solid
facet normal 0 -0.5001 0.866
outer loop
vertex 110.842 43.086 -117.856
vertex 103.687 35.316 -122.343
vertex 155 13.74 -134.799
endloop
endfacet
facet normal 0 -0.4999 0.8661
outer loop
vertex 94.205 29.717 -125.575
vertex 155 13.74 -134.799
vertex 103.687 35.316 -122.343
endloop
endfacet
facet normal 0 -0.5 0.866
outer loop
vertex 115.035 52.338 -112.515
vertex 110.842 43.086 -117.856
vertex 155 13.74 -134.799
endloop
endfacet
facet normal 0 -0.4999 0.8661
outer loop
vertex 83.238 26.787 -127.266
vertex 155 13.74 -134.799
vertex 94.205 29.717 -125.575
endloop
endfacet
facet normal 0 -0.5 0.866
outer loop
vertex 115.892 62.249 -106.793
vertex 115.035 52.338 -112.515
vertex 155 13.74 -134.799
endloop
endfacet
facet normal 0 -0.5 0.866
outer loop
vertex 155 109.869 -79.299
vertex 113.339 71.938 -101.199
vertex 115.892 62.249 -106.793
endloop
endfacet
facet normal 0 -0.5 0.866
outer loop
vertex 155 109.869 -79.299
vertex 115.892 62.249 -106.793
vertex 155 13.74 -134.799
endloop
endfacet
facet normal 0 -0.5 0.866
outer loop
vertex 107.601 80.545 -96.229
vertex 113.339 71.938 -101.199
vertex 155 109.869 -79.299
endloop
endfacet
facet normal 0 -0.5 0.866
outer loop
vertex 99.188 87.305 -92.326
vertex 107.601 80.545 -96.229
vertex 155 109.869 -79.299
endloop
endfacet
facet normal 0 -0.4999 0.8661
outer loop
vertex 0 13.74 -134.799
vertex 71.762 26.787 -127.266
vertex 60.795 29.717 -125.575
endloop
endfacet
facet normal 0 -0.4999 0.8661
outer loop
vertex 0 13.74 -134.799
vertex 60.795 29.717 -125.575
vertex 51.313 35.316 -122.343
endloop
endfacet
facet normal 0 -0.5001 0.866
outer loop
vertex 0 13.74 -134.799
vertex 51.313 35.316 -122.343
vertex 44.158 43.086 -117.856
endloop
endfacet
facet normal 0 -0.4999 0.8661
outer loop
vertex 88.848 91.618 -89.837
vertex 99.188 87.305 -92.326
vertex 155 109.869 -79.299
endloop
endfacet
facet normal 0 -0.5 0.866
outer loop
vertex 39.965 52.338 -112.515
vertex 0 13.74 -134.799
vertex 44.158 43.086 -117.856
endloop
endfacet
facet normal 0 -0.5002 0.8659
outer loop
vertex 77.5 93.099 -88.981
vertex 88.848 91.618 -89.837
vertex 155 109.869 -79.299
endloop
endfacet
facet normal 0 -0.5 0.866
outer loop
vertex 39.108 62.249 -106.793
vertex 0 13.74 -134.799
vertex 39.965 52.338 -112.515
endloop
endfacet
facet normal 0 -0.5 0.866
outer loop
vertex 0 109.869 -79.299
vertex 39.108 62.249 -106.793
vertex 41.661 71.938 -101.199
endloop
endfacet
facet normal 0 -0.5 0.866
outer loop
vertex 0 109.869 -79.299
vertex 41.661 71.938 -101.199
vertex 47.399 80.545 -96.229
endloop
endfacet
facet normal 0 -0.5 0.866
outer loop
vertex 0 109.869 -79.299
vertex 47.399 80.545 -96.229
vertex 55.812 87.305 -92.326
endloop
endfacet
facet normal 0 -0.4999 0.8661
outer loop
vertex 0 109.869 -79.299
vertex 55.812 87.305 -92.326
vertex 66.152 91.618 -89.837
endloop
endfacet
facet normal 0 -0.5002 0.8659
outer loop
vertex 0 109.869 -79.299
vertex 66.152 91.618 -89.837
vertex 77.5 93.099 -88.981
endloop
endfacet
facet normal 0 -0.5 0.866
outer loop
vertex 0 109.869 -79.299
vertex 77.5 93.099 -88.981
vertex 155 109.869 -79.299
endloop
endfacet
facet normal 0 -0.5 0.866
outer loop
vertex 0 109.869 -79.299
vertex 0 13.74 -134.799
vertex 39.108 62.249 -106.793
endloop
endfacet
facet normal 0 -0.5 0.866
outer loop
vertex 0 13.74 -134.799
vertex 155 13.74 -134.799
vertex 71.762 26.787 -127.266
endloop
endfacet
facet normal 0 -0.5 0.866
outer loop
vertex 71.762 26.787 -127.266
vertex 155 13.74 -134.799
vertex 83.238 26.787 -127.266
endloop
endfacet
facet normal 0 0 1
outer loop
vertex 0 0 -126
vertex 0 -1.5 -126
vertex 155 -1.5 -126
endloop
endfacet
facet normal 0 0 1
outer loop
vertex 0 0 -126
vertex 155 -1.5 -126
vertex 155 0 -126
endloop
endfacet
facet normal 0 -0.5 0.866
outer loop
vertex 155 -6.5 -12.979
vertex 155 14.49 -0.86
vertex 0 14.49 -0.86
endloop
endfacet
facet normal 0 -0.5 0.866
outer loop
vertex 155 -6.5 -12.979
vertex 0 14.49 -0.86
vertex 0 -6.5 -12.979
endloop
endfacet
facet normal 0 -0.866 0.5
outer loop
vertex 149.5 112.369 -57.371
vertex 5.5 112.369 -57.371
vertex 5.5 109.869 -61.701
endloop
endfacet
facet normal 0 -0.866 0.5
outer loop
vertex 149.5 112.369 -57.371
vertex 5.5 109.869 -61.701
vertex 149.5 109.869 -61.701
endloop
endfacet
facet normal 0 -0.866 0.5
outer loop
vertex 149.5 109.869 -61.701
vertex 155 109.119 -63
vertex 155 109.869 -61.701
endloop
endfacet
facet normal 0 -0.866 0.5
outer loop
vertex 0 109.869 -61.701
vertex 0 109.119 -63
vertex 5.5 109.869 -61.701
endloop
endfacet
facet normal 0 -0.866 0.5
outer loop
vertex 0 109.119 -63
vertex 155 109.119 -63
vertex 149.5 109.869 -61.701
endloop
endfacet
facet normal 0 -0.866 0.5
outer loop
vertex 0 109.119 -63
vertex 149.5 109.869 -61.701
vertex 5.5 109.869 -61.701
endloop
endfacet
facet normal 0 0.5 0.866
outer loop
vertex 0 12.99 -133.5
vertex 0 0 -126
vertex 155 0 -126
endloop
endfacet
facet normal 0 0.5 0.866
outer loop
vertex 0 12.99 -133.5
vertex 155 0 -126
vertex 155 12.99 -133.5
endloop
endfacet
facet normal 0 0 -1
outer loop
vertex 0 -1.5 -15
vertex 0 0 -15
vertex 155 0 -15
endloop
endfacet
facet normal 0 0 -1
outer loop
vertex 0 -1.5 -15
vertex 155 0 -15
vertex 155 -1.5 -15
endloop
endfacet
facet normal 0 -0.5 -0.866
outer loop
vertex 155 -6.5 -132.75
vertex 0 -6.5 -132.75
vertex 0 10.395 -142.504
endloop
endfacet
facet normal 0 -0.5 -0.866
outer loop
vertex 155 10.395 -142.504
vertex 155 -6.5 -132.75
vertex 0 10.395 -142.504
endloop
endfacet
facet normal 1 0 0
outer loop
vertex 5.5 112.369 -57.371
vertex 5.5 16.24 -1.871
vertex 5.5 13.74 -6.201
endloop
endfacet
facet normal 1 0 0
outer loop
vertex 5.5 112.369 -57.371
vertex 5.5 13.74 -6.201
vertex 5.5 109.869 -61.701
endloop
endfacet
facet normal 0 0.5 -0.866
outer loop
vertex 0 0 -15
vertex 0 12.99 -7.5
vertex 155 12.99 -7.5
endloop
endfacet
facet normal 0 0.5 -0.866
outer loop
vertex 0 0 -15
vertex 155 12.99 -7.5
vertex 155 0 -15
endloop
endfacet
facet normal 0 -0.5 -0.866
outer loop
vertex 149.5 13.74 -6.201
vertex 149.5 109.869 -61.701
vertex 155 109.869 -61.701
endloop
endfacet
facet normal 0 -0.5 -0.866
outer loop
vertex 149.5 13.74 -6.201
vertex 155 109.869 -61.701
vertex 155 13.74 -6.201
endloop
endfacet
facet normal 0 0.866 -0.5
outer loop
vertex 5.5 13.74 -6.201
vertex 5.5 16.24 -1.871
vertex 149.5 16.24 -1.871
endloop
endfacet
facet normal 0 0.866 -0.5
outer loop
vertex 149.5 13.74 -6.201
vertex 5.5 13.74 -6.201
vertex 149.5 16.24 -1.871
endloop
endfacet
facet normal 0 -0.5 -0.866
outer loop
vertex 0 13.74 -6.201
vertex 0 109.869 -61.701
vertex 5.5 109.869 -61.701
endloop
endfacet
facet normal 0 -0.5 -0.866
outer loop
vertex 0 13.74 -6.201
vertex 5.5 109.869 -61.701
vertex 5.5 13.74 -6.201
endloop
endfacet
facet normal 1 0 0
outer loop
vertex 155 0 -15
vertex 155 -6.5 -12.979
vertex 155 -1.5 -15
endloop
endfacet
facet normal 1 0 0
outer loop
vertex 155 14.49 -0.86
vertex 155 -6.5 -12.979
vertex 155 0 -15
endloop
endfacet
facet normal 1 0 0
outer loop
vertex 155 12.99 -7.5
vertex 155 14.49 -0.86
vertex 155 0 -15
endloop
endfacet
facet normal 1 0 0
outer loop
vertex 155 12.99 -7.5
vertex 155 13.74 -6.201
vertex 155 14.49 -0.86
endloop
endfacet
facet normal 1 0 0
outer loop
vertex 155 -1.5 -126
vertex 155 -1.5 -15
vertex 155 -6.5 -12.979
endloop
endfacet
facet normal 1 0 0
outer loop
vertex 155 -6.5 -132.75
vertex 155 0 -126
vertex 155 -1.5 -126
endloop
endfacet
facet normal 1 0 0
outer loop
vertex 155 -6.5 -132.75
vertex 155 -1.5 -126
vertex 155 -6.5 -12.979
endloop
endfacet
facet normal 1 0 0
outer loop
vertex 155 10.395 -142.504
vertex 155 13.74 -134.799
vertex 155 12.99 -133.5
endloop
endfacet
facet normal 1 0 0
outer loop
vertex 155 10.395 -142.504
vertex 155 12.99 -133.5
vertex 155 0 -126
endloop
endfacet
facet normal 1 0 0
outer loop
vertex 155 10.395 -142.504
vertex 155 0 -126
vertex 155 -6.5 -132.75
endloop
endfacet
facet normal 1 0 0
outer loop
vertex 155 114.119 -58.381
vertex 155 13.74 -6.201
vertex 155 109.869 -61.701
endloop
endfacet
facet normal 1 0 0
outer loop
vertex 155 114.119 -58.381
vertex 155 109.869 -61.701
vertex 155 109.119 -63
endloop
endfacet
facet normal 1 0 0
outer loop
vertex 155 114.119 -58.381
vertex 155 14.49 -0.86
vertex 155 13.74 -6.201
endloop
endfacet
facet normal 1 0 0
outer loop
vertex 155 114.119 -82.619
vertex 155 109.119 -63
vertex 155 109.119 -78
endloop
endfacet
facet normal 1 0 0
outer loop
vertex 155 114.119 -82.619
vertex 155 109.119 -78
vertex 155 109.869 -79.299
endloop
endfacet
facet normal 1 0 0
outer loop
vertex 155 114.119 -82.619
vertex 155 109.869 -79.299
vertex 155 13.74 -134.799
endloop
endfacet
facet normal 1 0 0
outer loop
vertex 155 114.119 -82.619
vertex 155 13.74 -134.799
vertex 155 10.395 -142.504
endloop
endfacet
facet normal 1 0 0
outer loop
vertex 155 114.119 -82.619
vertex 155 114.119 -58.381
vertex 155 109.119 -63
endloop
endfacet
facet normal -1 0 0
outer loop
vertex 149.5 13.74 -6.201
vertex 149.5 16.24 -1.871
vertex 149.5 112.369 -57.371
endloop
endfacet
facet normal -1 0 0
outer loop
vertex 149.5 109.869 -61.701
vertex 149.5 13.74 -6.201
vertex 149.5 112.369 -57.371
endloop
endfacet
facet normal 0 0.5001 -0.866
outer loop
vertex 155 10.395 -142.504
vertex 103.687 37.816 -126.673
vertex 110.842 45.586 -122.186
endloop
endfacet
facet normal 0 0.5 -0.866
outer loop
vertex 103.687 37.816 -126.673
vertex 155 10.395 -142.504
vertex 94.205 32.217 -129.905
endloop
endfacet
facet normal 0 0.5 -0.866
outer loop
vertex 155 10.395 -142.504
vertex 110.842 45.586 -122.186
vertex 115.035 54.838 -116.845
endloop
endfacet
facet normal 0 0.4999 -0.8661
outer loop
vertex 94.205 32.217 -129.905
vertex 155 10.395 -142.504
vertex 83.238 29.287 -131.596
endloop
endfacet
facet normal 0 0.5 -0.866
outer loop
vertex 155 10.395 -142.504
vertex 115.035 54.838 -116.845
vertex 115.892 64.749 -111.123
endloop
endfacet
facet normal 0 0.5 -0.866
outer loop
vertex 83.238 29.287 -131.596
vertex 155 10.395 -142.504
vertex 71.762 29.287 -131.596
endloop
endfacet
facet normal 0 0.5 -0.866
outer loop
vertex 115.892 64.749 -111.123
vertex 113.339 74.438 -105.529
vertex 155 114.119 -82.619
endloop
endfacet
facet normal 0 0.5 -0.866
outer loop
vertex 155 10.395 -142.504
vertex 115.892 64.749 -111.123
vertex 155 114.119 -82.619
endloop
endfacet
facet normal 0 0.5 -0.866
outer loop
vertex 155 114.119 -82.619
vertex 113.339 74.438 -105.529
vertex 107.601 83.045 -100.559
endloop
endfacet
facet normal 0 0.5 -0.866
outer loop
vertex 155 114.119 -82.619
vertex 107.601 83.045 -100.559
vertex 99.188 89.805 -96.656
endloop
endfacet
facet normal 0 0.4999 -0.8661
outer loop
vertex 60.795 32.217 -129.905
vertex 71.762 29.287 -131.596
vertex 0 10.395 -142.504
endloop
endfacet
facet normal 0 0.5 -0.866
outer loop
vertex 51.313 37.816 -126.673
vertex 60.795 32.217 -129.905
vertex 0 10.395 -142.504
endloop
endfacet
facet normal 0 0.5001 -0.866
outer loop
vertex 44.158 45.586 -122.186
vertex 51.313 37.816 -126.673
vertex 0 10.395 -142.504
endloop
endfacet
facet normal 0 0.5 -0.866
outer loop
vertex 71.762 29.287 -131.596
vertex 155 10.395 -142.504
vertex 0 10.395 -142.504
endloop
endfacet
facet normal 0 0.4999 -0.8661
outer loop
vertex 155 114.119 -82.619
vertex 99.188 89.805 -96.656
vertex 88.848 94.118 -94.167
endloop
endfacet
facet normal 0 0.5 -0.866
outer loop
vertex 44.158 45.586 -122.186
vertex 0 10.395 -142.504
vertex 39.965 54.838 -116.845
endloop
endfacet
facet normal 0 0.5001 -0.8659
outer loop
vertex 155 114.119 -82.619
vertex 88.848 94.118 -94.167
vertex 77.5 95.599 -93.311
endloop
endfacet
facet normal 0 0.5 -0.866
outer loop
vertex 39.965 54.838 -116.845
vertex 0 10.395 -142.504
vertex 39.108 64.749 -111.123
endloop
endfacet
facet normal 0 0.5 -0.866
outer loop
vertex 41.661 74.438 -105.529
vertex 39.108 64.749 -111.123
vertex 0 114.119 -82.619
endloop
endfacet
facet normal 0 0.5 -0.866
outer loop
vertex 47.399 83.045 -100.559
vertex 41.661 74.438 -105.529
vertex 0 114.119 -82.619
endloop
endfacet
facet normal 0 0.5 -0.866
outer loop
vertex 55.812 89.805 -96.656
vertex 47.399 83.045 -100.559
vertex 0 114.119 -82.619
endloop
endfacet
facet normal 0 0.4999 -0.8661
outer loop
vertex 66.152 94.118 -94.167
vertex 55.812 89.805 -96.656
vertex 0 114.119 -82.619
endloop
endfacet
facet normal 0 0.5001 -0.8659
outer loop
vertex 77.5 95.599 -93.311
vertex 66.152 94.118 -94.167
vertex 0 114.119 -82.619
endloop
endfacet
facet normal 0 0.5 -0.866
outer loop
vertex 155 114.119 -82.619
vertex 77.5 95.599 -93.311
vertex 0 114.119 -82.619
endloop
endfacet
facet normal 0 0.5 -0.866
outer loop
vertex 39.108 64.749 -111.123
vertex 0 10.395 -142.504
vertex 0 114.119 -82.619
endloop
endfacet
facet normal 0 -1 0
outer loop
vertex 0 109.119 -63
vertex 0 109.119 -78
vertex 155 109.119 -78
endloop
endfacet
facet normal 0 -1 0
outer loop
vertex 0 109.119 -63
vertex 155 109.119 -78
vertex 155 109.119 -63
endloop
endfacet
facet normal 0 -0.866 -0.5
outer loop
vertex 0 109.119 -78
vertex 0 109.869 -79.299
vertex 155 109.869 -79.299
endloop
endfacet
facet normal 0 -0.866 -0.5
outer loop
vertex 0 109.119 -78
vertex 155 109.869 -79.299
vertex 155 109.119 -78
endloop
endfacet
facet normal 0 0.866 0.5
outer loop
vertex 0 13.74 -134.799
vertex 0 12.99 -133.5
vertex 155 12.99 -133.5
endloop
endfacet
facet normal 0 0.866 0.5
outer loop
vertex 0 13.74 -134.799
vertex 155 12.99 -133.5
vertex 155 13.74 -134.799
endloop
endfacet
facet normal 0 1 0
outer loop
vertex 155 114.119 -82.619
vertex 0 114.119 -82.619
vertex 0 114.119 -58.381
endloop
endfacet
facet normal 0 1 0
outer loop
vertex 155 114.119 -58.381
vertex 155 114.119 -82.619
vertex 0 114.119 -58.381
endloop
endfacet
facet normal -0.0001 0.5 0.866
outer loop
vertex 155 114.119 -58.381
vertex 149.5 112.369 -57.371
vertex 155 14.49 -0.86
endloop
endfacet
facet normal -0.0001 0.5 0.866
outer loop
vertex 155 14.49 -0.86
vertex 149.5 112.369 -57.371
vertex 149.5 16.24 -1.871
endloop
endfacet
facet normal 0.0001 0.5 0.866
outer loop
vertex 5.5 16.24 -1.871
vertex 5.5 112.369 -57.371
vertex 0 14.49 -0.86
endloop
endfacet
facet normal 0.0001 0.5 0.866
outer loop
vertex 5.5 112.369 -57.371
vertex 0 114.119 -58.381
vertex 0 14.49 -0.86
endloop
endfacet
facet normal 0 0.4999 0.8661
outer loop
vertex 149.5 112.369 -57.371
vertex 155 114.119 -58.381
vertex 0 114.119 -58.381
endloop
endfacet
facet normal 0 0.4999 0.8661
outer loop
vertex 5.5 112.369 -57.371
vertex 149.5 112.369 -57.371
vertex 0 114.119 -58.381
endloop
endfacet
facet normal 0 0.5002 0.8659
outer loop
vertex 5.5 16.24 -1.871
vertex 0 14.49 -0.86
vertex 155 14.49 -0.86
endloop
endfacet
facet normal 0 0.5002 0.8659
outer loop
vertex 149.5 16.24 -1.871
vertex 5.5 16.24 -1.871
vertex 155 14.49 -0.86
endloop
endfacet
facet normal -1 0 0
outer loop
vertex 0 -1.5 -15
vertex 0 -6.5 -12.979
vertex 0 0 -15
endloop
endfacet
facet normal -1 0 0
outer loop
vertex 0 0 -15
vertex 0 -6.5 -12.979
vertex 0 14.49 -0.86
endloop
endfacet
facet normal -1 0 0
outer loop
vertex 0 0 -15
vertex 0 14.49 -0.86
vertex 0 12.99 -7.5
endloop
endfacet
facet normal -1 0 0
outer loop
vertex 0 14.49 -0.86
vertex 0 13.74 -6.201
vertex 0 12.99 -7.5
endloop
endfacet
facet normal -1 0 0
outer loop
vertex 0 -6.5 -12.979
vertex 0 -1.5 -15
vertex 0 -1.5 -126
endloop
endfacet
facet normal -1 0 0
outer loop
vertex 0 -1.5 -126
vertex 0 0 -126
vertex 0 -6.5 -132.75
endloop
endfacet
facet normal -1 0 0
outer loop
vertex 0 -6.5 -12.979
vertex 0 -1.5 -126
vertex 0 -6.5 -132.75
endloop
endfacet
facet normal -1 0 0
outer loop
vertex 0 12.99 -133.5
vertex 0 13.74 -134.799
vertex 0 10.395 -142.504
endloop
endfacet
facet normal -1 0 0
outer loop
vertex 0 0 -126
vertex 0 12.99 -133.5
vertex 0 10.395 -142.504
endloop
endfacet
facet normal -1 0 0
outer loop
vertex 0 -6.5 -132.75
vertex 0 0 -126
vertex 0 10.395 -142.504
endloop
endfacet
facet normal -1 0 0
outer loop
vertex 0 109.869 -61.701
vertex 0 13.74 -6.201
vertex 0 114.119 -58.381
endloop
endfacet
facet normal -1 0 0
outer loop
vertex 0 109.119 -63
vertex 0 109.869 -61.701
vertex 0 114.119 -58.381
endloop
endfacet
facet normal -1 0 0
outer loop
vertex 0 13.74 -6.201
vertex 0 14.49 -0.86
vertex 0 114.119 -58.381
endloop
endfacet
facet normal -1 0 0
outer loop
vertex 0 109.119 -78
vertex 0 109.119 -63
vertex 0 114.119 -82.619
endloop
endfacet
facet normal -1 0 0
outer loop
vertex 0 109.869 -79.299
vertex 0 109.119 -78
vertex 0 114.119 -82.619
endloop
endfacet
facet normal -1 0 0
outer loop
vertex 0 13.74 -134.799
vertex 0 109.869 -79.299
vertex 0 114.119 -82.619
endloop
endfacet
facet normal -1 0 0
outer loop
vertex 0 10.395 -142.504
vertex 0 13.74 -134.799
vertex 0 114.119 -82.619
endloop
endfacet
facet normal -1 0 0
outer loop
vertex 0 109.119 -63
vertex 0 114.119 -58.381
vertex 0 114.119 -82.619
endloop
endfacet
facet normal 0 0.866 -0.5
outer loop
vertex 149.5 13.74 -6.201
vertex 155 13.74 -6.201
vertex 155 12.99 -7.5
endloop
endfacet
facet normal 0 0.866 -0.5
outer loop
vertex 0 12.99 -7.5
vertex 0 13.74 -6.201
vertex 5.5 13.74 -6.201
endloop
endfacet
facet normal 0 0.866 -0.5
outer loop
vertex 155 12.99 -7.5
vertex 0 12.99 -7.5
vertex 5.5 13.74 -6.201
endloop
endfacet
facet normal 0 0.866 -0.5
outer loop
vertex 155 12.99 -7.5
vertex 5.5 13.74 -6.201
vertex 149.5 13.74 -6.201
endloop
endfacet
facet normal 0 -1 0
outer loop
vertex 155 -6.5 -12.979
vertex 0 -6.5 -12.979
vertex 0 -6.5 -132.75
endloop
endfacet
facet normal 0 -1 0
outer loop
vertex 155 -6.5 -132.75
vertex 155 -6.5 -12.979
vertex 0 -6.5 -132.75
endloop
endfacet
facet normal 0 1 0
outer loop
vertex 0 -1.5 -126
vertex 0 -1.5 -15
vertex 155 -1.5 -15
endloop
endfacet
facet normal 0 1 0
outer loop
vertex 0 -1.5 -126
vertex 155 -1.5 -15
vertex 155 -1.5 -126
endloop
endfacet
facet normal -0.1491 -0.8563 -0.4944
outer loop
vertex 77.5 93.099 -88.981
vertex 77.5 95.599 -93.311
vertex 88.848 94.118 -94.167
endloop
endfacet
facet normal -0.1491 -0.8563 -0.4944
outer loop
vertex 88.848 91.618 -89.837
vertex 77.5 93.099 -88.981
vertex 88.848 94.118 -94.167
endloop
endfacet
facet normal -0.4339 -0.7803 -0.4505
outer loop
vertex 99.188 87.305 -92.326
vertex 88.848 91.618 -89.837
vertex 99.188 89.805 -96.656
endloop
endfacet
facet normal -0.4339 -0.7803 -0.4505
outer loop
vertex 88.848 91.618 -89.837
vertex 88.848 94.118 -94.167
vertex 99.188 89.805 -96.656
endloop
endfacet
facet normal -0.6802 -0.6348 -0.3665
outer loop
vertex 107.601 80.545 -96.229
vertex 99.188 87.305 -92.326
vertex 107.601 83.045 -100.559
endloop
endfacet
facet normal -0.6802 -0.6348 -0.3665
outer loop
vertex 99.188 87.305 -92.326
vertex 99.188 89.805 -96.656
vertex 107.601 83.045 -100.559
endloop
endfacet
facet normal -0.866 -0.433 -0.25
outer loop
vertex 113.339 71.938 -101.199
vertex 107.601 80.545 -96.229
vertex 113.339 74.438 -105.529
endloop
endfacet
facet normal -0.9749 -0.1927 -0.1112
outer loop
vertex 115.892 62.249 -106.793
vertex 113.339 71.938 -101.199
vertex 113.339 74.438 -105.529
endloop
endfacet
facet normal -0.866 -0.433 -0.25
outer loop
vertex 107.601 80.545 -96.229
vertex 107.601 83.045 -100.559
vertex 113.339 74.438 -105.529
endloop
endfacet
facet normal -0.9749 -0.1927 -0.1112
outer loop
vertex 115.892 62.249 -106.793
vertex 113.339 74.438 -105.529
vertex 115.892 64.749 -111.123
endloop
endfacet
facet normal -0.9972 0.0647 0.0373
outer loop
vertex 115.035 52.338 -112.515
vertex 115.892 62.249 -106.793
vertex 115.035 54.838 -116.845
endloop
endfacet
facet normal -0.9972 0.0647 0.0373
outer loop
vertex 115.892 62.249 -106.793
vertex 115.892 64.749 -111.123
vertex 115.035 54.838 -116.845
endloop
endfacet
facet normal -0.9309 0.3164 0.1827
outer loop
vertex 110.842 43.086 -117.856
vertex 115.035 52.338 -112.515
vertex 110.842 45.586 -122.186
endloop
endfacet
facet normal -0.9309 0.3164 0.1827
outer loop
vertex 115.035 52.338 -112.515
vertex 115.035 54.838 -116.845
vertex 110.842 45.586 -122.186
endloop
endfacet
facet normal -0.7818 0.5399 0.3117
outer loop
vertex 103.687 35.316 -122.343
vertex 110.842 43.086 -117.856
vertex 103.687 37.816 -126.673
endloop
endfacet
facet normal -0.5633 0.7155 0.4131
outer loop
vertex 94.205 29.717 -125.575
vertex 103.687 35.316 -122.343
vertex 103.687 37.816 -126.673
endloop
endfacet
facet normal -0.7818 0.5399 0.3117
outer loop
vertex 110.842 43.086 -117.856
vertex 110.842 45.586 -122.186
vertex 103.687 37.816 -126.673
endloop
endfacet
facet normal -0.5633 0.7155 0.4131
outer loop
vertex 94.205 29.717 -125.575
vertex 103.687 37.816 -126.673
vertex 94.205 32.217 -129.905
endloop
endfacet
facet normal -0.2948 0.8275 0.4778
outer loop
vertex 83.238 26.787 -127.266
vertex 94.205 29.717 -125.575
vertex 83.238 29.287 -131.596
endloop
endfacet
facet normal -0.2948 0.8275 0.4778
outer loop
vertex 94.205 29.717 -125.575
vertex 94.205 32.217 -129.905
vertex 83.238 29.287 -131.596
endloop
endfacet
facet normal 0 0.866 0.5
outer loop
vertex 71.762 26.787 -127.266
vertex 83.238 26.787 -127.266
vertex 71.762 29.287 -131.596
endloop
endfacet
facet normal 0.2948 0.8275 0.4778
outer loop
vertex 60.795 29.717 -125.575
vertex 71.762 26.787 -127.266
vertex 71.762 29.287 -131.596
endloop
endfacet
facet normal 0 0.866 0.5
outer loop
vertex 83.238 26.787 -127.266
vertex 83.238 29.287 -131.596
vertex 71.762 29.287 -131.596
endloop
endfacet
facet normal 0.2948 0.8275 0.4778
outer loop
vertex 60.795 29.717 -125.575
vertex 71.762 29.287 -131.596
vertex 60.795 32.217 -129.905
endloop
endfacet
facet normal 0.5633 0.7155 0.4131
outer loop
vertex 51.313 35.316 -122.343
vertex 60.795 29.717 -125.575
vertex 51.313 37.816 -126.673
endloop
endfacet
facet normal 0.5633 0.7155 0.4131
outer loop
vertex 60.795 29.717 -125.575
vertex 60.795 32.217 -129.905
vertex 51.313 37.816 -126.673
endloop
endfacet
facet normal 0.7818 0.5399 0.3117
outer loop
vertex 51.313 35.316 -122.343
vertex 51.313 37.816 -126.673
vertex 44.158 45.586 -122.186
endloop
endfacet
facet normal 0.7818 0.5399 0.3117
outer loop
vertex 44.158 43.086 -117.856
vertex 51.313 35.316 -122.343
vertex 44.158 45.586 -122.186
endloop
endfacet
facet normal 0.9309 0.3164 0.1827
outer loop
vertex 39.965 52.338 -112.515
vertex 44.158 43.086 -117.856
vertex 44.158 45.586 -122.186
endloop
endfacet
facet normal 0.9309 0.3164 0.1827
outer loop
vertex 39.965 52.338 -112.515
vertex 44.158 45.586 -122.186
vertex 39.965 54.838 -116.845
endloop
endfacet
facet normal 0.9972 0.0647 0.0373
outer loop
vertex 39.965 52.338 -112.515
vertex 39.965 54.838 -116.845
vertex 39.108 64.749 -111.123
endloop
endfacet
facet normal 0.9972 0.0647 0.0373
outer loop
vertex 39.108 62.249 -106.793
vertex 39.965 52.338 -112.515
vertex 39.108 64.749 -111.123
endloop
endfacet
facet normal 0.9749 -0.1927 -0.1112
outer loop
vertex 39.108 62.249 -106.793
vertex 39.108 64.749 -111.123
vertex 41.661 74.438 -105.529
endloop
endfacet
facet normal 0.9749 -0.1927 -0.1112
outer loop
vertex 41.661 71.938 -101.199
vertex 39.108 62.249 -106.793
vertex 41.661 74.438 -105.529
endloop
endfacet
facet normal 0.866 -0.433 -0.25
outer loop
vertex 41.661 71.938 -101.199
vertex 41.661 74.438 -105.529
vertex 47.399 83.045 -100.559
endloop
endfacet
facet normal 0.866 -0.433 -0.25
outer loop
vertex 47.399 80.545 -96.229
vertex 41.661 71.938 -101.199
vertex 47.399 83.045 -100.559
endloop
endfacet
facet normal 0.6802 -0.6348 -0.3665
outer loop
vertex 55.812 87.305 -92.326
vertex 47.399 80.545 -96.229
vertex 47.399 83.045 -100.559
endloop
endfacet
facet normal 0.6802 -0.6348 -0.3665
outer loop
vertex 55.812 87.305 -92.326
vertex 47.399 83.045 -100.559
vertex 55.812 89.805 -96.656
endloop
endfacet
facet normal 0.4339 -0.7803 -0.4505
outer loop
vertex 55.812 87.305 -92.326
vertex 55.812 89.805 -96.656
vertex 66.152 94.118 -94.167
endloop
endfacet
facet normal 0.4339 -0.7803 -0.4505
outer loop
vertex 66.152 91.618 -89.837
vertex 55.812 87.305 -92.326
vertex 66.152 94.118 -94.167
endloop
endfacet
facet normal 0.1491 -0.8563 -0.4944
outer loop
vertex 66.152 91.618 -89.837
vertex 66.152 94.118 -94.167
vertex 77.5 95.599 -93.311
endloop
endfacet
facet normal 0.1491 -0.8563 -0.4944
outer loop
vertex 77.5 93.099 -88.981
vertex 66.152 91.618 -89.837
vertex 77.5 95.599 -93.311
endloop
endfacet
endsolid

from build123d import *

# Parameters (mm, degrees)
BOSS_EXTRUDE1_DEPTH = 155
SKETCH4_W           = 144
SKETCH4_H           = 111
CUT_EXTRUDE1_DEPTH  = 5
SKETCH5_R           = 38.5
CUT_EXTRUDE2_DEPTH  = 10


with BuildPart() as part:
    # Sketch3 → Boss-Extrude1 (new body)
    with BuildSketch(Plane(origin=(0, 0, 0), x_dir=(0, 0, -1), z_dir=(1, 0, 0))):
        Polygon((58.381197846, 114.119200877), (0.860471904, 14.490381057), (12.979274058, -6.5), (132.75, -6.5), (142.504165125, 10.394709581), (82.618802154, 114.119200877), align=None)
        Polygon((7.5, 12.990381057), (15, 0), (15, -1.5), (126, -1.5), (126, 0), (133.5, 12.990381057), (134.799038106, 13.740381057), (79.299038106, 109.869200877), (78, 109.119200877), (63, 109.119200877), (61.700961894, 109.869200877), (6.200961894, 13.740381057), align=None, mode=Mode.SUBTRACT)
    extrude(amount=BOSS_EXTRUDE1_DEPTH)

    # Sketch4 → Cut-Extrude1 (cut)
    with BuildSketch(Plane(origin=(0, 3.25, 5.629165125), x_dir=(1, 0, 0), z_dir=(0, 0.4999999999999995, 0.8660254037844389))):
        with Locations((77.5, 70.5)):
            Rectangle(SKETCH4_W, SKETCH4_H)
    extrude(amount=-CUT_EXTRUDE1_DEPTH, mode=Mode.SUBTRACT)

    # Sketch5 → Cut-Extrude2 (cut)
    with BuildSketch(Plane(origin=(0, 64.304790967, -111.379165125), x_dir=(-1, 0, 0), z_dir=(0, 0.5000000000000006, -0.8660254037844385))):
        with Locations(Location((-77.5, -2.364637029, 0), (0, 0, 90))):
            Circle(SKETCH5_R)
    extrude(amount=-CUT_EXTRUDE2_DEPTH, mode=Mode.SUBTRACT)


solid = part.part
